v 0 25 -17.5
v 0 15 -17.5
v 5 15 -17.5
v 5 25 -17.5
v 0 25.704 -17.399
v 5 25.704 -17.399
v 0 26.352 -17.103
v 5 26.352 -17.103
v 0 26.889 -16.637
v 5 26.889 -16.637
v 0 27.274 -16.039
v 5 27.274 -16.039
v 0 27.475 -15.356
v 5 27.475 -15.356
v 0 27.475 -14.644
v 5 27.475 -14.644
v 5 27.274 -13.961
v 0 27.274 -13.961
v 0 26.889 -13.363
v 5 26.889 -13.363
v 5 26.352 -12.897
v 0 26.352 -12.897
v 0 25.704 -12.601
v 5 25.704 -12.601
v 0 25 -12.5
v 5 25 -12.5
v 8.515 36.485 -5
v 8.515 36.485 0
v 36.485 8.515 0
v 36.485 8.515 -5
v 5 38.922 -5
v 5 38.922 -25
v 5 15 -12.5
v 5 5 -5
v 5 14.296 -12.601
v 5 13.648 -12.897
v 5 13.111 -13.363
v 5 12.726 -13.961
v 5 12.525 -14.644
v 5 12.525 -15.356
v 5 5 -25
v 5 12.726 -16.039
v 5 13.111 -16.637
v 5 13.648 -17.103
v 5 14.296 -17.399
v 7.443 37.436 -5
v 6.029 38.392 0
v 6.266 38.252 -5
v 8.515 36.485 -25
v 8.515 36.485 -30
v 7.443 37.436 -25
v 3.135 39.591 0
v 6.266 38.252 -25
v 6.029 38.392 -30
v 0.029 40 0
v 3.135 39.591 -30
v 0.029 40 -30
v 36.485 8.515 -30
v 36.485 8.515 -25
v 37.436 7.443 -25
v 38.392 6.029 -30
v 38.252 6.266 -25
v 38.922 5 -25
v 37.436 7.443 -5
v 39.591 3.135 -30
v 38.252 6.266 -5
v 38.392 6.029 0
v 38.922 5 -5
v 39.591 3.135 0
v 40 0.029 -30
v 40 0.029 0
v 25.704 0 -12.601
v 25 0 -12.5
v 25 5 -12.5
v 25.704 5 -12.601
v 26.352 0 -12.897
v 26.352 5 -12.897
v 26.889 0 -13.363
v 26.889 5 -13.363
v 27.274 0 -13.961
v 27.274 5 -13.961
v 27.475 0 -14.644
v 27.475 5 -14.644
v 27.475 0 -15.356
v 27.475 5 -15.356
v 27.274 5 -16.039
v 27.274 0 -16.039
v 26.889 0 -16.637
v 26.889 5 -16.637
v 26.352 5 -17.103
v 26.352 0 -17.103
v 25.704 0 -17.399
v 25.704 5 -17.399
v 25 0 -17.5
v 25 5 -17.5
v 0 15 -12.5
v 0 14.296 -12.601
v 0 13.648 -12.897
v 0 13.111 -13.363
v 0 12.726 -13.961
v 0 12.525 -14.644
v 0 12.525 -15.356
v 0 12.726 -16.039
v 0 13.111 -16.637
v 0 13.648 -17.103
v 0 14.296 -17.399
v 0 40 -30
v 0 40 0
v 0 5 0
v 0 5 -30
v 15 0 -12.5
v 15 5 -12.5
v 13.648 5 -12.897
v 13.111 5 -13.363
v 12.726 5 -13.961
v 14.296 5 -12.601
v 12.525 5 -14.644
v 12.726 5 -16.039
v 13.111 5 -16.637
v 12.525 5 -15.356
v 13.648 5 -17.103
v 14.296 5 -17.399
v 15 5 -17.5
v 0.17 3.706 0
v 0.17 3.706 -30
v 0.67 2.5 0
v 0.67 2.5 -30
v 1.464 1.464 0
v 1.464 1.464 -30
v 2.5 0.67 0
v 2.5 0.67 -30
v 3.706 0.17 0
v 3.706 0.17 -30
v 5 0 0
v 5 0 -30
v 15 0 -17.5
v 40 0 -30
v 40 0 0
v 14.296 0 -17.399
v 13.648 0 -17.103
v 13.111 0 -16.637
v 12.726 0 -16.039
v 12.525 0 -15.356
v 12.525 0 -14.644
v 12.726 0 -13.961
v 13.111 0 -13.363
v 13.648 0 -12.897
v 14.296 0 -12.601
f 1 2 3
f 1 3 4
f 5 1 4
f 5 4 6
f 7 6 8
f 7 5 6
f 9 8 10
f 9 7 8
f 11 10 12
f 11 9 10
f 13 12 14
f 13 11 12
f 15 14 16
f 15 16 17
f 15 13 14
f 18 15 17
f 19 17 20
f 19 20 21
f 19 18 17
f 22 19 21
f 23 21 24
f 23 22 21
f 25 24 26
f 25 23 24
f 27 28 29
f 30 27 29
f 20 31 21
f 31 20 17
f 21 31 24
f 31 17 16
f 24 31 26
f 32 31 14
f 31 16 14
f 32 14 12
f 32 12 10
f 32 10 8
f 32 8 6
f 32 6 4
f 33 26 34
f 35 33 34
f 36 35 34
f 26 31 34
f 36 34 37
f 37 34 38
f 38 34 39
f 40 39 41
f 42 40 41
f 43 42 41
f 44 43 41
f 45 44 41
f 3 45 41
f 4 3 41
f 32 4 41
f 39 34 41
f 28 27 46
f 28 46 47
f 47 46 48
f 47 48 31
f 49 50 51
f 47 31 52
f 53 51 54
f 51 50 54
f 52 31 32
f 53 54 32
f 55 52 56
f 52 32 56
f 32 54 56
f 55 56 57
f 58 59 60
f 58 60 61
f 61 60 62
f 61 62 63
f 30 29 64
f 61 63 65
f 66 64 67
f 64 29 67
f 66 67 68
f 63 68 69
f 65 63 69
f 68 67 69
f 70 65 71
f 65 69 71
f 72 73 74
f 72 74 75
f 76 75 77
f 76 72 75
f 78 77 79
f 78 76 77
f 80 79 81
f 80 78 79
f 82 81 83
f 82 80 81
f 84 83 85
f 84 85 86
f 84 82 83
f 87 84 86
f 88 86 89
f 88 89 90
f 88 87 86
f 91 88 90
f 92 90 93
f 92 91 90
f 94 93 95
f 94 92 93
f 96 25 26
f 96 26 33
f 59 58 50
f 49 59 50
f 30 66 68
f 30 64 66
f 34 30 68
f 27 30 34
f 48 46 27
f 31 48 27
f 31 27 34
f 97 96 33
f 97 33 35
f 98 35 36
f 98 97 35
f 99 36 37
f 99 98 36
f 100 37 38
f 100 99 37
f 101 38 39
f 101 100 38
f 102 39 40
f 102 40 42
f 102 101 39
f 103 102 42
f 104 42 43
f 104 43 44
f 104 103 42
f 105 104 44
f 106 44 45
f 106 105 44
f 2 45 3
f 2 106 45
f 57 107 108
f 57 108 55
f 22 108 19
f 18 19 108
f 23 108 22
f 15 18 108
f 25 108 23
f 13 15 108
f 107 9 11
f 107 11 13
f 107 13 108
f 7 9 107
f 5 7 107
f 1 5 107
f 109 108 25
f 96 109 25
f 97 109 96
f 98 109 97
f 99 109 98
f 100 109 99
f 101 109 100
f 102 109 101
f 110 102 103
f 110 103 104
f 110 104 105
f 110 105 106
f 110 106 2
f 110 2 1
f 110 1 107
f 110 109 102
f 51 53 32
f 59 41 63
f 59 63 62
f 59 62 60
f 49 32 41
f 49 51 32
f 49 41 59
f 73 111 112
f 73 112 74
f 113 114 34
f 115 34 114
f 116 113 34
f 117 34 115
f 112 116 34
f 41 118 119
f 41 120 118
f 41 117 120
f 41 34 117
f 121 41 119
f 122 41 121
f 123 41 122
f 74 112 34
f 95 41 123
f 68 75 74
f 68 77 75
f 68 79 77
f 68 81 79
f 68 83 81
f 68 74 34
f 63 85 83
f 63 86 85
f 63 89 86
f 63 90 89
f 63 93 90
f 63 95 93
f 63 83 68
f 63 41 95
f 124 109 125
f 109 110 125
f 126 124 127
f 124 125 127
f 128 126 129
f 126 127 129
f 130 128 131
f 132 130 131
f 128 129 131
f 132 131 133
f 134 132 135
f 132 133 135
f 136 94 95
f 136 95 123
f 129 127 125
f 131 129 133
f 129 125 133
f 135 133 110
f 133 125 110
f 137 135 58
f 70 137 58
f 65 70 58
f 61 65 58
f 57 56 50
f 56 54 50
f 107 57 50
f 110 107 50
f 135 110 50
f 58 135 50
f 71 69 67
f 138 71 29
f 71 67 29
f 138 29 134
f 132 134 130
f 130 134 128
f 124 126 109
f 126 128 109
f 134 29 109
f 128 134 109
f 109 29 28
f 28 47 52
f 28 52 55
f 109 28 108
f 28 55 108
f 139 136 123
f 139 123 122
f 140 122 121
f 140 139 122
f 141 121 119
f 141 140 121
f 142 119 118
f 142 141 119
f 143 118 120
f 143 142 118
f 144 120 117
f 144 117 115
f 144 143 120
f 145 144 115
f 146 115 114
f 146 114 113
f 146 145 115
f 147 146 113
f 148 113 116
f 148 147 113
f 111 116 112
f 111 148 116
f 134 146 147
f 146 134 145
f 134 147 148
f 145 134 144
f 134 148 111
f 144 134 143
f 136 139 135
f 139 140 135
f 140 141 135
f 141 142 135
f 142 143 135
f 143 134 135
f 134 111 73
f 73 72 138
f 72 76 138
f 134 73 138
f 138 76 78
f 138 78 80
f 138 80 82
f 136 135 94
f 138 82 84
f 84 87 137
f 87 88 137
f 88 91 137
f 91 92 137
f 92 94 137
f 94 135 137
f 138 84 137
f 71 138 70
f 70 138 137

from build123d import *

# Parameters (mm, degrees)
SKETCH1_W           = 40
SKETCH1_H           = 30
BOSS_EXTRUDE1_DEPTH = 5
SKETCH2_W           = 5
SKETCH2_H           = 30
BOSS_EXTRUDE2_DEPTH = 35
BOSS_EXTRUDE3_DEPTH = 5
BOSS_EXTRUDE4_DEPTH = 5
CUT_EXTRUDE1_DEPTH  = 5
CUT_EXTRUDE2_DEPTH  = 5
FILLET4_R           = 12
FILLET5_R           = 12
FILLET6_R           = 5


with BuildPart() as part:
    # Sketch1 → Boss-Extrude1 (new body)
    with BuildSketch(Plane(origin=(0, 0, 0), x_dir=(1, 0, 0), z_dir=(0, 1, 0))):
        with Locations((20, 15)):
            Rectangle(SKETCH1_W, SKETCH1_H)
    extrude(amount=BOSS_EXTRUDE1_DEPTH)

    # Sketch2 → Boss-Extrude2 (add)
    with BuildSketch(Plane(origin=(0, 5, 0), x_dir=(1, 0, 0), z_dir=(0, 1, 0))):
        with Locations((2.5, 15)):
            Rectangle(SKETCH2_W, SKETCH2_H)
    extrude(amount=BOSS_EXTRUDE2_DEPTH)

    # Sketch3 → Boss-Extrude3 (add)
    with BuildSketch(Plane.XY):
        Polygon((5, 40), (40, 5), (5, 5), align=None)
    extrude(amount=-BOSS_EXTRUDE3_DEPTH)

    # Sketch4 → Boss-Extrude4 (add)
    with BuildSketch(Plane(origin=(0, 0, -30), x_dir=(-1, 0, 0), z_dir=(0, 0, -1))):
        Polygon((-40, 5), (-5, 40), (-5, 5), align=None)
    extrude(amount=-BOSS_EXTRUDE4_DEPTH)

    # Sketch5 → Cut-Extrude1 (cut)
    with BuildSketch(Plane.XZ):
        with BuildLine():
            Line((15, -12.5), (25, -12.5))
            ThreePointArc((25, -12.5), (27.5, -15), (25, -17.5))
            Line((25, -17.5), (15, -17.5))
            ThreePointArc((15, -17.5), (12.5, -15), (15, -12.5))
        make_face()
    extrude(amount=-CUT_EXTRUDE1_DEPTH, mode=Mode.SUBTRACT)

    # Sketch6 → Cut-Extrude2 (cut)
    with BuildSketch(Plane.ZY):
        with BuildLine():
            Line((-12.5, 25), (-12.5, 15))
            ThreePointArc((-12.5, 15), (-15, 12.5), (-17.5, 15))
            Line((-17.5, 15), (-17.5, 25))
            ThreePointArc((-17.5, 25), (-15, 27.5), (-12.5, 25))
        make_face()
    extrude(amount=-CUT_EXTRUDE2_DEPTH, mode=Mode.SUBTRACT)

    # Fillet4
    # the kernel refuses this fillet: 12 mm, written as the material it takes off along each edge
    with BuildSketch(Plane(origin=(40, 5, 12.426406871), x_dir=(-0.7071067811865481, 0.707106781186547, 0), z_dir=(0, 0, -1))) as fillet4_piece_1:
        with BuildLine():
            CenterArc((FILLET4_R * 0.414213562373, -FILLET4_R), FILLET4_R, 90, 45)
            Line((-FILLET4_R * 0.292893218813, -FILLET4_R * 0.292893218813), (0, 0))
            Line((0, 0), (FILLET4_R * 0.414213562373, 0))
        make_face()
    extrude(amount=29.852813742, mode=Mode.SUBTRACT)
    with BuildSketch(Plane(origin=(40, 5, -12.573593129), x_dir=(0, -1, 0), z_dir=(0, 0, -1))) as fillet4_piece_2:
        with BuildLine():
            CenterArc((FILLET4_R * 0.414213562373, FILLET4_R), FILLET4_R, 225, 45)
            Line((-FILLET4_R * 0.292893218813, FILLET4_R * 0.292893218813), (0, 0))
            Line((0, 0), (FILLET4_R * 0.414213562373, 0))
        make_face()
    extrude(amount=29.852813742, mode=Mode.SUBTRACT)

    # Fillet5
    # the kernel refuses this fillet: 12 mm, written as the material it takes off along each edge
    with BuildSketch(Plane(origin=(5, 40, -17.426406871), x_dir=(-1, 0, 0), z_dir=(0, 0, 1)), Plane(origin=(5, 40, -42.426406871), x_dir=(-1, 0, 0), z_dir=(0, 0, 1))) as fillet5_piece_1:
        with BuildLine():
            CenterArc((FILLET5_R * 0.414213562373, FILLET5_R), FILLET5_R, 225, 45)
            Line((-FILLET5_R * 0.292893218813, FILLET5_R * 0.292893218813), (0, 0))
            Line((0, 0), (FILLET5_R * 0.414213562373, 0))
        make_face()
    extrude(amount=29.852813742, mode=Mode.SUBTRACT)

    # Fillet6
    fillet6_edges = [part.edges().sort_by_distance(p)[0] for p in [
        (0, 0, -15),
    ]]
    fillet(fillet6_edges, radius=FILLET6_R)


solid = part.part
